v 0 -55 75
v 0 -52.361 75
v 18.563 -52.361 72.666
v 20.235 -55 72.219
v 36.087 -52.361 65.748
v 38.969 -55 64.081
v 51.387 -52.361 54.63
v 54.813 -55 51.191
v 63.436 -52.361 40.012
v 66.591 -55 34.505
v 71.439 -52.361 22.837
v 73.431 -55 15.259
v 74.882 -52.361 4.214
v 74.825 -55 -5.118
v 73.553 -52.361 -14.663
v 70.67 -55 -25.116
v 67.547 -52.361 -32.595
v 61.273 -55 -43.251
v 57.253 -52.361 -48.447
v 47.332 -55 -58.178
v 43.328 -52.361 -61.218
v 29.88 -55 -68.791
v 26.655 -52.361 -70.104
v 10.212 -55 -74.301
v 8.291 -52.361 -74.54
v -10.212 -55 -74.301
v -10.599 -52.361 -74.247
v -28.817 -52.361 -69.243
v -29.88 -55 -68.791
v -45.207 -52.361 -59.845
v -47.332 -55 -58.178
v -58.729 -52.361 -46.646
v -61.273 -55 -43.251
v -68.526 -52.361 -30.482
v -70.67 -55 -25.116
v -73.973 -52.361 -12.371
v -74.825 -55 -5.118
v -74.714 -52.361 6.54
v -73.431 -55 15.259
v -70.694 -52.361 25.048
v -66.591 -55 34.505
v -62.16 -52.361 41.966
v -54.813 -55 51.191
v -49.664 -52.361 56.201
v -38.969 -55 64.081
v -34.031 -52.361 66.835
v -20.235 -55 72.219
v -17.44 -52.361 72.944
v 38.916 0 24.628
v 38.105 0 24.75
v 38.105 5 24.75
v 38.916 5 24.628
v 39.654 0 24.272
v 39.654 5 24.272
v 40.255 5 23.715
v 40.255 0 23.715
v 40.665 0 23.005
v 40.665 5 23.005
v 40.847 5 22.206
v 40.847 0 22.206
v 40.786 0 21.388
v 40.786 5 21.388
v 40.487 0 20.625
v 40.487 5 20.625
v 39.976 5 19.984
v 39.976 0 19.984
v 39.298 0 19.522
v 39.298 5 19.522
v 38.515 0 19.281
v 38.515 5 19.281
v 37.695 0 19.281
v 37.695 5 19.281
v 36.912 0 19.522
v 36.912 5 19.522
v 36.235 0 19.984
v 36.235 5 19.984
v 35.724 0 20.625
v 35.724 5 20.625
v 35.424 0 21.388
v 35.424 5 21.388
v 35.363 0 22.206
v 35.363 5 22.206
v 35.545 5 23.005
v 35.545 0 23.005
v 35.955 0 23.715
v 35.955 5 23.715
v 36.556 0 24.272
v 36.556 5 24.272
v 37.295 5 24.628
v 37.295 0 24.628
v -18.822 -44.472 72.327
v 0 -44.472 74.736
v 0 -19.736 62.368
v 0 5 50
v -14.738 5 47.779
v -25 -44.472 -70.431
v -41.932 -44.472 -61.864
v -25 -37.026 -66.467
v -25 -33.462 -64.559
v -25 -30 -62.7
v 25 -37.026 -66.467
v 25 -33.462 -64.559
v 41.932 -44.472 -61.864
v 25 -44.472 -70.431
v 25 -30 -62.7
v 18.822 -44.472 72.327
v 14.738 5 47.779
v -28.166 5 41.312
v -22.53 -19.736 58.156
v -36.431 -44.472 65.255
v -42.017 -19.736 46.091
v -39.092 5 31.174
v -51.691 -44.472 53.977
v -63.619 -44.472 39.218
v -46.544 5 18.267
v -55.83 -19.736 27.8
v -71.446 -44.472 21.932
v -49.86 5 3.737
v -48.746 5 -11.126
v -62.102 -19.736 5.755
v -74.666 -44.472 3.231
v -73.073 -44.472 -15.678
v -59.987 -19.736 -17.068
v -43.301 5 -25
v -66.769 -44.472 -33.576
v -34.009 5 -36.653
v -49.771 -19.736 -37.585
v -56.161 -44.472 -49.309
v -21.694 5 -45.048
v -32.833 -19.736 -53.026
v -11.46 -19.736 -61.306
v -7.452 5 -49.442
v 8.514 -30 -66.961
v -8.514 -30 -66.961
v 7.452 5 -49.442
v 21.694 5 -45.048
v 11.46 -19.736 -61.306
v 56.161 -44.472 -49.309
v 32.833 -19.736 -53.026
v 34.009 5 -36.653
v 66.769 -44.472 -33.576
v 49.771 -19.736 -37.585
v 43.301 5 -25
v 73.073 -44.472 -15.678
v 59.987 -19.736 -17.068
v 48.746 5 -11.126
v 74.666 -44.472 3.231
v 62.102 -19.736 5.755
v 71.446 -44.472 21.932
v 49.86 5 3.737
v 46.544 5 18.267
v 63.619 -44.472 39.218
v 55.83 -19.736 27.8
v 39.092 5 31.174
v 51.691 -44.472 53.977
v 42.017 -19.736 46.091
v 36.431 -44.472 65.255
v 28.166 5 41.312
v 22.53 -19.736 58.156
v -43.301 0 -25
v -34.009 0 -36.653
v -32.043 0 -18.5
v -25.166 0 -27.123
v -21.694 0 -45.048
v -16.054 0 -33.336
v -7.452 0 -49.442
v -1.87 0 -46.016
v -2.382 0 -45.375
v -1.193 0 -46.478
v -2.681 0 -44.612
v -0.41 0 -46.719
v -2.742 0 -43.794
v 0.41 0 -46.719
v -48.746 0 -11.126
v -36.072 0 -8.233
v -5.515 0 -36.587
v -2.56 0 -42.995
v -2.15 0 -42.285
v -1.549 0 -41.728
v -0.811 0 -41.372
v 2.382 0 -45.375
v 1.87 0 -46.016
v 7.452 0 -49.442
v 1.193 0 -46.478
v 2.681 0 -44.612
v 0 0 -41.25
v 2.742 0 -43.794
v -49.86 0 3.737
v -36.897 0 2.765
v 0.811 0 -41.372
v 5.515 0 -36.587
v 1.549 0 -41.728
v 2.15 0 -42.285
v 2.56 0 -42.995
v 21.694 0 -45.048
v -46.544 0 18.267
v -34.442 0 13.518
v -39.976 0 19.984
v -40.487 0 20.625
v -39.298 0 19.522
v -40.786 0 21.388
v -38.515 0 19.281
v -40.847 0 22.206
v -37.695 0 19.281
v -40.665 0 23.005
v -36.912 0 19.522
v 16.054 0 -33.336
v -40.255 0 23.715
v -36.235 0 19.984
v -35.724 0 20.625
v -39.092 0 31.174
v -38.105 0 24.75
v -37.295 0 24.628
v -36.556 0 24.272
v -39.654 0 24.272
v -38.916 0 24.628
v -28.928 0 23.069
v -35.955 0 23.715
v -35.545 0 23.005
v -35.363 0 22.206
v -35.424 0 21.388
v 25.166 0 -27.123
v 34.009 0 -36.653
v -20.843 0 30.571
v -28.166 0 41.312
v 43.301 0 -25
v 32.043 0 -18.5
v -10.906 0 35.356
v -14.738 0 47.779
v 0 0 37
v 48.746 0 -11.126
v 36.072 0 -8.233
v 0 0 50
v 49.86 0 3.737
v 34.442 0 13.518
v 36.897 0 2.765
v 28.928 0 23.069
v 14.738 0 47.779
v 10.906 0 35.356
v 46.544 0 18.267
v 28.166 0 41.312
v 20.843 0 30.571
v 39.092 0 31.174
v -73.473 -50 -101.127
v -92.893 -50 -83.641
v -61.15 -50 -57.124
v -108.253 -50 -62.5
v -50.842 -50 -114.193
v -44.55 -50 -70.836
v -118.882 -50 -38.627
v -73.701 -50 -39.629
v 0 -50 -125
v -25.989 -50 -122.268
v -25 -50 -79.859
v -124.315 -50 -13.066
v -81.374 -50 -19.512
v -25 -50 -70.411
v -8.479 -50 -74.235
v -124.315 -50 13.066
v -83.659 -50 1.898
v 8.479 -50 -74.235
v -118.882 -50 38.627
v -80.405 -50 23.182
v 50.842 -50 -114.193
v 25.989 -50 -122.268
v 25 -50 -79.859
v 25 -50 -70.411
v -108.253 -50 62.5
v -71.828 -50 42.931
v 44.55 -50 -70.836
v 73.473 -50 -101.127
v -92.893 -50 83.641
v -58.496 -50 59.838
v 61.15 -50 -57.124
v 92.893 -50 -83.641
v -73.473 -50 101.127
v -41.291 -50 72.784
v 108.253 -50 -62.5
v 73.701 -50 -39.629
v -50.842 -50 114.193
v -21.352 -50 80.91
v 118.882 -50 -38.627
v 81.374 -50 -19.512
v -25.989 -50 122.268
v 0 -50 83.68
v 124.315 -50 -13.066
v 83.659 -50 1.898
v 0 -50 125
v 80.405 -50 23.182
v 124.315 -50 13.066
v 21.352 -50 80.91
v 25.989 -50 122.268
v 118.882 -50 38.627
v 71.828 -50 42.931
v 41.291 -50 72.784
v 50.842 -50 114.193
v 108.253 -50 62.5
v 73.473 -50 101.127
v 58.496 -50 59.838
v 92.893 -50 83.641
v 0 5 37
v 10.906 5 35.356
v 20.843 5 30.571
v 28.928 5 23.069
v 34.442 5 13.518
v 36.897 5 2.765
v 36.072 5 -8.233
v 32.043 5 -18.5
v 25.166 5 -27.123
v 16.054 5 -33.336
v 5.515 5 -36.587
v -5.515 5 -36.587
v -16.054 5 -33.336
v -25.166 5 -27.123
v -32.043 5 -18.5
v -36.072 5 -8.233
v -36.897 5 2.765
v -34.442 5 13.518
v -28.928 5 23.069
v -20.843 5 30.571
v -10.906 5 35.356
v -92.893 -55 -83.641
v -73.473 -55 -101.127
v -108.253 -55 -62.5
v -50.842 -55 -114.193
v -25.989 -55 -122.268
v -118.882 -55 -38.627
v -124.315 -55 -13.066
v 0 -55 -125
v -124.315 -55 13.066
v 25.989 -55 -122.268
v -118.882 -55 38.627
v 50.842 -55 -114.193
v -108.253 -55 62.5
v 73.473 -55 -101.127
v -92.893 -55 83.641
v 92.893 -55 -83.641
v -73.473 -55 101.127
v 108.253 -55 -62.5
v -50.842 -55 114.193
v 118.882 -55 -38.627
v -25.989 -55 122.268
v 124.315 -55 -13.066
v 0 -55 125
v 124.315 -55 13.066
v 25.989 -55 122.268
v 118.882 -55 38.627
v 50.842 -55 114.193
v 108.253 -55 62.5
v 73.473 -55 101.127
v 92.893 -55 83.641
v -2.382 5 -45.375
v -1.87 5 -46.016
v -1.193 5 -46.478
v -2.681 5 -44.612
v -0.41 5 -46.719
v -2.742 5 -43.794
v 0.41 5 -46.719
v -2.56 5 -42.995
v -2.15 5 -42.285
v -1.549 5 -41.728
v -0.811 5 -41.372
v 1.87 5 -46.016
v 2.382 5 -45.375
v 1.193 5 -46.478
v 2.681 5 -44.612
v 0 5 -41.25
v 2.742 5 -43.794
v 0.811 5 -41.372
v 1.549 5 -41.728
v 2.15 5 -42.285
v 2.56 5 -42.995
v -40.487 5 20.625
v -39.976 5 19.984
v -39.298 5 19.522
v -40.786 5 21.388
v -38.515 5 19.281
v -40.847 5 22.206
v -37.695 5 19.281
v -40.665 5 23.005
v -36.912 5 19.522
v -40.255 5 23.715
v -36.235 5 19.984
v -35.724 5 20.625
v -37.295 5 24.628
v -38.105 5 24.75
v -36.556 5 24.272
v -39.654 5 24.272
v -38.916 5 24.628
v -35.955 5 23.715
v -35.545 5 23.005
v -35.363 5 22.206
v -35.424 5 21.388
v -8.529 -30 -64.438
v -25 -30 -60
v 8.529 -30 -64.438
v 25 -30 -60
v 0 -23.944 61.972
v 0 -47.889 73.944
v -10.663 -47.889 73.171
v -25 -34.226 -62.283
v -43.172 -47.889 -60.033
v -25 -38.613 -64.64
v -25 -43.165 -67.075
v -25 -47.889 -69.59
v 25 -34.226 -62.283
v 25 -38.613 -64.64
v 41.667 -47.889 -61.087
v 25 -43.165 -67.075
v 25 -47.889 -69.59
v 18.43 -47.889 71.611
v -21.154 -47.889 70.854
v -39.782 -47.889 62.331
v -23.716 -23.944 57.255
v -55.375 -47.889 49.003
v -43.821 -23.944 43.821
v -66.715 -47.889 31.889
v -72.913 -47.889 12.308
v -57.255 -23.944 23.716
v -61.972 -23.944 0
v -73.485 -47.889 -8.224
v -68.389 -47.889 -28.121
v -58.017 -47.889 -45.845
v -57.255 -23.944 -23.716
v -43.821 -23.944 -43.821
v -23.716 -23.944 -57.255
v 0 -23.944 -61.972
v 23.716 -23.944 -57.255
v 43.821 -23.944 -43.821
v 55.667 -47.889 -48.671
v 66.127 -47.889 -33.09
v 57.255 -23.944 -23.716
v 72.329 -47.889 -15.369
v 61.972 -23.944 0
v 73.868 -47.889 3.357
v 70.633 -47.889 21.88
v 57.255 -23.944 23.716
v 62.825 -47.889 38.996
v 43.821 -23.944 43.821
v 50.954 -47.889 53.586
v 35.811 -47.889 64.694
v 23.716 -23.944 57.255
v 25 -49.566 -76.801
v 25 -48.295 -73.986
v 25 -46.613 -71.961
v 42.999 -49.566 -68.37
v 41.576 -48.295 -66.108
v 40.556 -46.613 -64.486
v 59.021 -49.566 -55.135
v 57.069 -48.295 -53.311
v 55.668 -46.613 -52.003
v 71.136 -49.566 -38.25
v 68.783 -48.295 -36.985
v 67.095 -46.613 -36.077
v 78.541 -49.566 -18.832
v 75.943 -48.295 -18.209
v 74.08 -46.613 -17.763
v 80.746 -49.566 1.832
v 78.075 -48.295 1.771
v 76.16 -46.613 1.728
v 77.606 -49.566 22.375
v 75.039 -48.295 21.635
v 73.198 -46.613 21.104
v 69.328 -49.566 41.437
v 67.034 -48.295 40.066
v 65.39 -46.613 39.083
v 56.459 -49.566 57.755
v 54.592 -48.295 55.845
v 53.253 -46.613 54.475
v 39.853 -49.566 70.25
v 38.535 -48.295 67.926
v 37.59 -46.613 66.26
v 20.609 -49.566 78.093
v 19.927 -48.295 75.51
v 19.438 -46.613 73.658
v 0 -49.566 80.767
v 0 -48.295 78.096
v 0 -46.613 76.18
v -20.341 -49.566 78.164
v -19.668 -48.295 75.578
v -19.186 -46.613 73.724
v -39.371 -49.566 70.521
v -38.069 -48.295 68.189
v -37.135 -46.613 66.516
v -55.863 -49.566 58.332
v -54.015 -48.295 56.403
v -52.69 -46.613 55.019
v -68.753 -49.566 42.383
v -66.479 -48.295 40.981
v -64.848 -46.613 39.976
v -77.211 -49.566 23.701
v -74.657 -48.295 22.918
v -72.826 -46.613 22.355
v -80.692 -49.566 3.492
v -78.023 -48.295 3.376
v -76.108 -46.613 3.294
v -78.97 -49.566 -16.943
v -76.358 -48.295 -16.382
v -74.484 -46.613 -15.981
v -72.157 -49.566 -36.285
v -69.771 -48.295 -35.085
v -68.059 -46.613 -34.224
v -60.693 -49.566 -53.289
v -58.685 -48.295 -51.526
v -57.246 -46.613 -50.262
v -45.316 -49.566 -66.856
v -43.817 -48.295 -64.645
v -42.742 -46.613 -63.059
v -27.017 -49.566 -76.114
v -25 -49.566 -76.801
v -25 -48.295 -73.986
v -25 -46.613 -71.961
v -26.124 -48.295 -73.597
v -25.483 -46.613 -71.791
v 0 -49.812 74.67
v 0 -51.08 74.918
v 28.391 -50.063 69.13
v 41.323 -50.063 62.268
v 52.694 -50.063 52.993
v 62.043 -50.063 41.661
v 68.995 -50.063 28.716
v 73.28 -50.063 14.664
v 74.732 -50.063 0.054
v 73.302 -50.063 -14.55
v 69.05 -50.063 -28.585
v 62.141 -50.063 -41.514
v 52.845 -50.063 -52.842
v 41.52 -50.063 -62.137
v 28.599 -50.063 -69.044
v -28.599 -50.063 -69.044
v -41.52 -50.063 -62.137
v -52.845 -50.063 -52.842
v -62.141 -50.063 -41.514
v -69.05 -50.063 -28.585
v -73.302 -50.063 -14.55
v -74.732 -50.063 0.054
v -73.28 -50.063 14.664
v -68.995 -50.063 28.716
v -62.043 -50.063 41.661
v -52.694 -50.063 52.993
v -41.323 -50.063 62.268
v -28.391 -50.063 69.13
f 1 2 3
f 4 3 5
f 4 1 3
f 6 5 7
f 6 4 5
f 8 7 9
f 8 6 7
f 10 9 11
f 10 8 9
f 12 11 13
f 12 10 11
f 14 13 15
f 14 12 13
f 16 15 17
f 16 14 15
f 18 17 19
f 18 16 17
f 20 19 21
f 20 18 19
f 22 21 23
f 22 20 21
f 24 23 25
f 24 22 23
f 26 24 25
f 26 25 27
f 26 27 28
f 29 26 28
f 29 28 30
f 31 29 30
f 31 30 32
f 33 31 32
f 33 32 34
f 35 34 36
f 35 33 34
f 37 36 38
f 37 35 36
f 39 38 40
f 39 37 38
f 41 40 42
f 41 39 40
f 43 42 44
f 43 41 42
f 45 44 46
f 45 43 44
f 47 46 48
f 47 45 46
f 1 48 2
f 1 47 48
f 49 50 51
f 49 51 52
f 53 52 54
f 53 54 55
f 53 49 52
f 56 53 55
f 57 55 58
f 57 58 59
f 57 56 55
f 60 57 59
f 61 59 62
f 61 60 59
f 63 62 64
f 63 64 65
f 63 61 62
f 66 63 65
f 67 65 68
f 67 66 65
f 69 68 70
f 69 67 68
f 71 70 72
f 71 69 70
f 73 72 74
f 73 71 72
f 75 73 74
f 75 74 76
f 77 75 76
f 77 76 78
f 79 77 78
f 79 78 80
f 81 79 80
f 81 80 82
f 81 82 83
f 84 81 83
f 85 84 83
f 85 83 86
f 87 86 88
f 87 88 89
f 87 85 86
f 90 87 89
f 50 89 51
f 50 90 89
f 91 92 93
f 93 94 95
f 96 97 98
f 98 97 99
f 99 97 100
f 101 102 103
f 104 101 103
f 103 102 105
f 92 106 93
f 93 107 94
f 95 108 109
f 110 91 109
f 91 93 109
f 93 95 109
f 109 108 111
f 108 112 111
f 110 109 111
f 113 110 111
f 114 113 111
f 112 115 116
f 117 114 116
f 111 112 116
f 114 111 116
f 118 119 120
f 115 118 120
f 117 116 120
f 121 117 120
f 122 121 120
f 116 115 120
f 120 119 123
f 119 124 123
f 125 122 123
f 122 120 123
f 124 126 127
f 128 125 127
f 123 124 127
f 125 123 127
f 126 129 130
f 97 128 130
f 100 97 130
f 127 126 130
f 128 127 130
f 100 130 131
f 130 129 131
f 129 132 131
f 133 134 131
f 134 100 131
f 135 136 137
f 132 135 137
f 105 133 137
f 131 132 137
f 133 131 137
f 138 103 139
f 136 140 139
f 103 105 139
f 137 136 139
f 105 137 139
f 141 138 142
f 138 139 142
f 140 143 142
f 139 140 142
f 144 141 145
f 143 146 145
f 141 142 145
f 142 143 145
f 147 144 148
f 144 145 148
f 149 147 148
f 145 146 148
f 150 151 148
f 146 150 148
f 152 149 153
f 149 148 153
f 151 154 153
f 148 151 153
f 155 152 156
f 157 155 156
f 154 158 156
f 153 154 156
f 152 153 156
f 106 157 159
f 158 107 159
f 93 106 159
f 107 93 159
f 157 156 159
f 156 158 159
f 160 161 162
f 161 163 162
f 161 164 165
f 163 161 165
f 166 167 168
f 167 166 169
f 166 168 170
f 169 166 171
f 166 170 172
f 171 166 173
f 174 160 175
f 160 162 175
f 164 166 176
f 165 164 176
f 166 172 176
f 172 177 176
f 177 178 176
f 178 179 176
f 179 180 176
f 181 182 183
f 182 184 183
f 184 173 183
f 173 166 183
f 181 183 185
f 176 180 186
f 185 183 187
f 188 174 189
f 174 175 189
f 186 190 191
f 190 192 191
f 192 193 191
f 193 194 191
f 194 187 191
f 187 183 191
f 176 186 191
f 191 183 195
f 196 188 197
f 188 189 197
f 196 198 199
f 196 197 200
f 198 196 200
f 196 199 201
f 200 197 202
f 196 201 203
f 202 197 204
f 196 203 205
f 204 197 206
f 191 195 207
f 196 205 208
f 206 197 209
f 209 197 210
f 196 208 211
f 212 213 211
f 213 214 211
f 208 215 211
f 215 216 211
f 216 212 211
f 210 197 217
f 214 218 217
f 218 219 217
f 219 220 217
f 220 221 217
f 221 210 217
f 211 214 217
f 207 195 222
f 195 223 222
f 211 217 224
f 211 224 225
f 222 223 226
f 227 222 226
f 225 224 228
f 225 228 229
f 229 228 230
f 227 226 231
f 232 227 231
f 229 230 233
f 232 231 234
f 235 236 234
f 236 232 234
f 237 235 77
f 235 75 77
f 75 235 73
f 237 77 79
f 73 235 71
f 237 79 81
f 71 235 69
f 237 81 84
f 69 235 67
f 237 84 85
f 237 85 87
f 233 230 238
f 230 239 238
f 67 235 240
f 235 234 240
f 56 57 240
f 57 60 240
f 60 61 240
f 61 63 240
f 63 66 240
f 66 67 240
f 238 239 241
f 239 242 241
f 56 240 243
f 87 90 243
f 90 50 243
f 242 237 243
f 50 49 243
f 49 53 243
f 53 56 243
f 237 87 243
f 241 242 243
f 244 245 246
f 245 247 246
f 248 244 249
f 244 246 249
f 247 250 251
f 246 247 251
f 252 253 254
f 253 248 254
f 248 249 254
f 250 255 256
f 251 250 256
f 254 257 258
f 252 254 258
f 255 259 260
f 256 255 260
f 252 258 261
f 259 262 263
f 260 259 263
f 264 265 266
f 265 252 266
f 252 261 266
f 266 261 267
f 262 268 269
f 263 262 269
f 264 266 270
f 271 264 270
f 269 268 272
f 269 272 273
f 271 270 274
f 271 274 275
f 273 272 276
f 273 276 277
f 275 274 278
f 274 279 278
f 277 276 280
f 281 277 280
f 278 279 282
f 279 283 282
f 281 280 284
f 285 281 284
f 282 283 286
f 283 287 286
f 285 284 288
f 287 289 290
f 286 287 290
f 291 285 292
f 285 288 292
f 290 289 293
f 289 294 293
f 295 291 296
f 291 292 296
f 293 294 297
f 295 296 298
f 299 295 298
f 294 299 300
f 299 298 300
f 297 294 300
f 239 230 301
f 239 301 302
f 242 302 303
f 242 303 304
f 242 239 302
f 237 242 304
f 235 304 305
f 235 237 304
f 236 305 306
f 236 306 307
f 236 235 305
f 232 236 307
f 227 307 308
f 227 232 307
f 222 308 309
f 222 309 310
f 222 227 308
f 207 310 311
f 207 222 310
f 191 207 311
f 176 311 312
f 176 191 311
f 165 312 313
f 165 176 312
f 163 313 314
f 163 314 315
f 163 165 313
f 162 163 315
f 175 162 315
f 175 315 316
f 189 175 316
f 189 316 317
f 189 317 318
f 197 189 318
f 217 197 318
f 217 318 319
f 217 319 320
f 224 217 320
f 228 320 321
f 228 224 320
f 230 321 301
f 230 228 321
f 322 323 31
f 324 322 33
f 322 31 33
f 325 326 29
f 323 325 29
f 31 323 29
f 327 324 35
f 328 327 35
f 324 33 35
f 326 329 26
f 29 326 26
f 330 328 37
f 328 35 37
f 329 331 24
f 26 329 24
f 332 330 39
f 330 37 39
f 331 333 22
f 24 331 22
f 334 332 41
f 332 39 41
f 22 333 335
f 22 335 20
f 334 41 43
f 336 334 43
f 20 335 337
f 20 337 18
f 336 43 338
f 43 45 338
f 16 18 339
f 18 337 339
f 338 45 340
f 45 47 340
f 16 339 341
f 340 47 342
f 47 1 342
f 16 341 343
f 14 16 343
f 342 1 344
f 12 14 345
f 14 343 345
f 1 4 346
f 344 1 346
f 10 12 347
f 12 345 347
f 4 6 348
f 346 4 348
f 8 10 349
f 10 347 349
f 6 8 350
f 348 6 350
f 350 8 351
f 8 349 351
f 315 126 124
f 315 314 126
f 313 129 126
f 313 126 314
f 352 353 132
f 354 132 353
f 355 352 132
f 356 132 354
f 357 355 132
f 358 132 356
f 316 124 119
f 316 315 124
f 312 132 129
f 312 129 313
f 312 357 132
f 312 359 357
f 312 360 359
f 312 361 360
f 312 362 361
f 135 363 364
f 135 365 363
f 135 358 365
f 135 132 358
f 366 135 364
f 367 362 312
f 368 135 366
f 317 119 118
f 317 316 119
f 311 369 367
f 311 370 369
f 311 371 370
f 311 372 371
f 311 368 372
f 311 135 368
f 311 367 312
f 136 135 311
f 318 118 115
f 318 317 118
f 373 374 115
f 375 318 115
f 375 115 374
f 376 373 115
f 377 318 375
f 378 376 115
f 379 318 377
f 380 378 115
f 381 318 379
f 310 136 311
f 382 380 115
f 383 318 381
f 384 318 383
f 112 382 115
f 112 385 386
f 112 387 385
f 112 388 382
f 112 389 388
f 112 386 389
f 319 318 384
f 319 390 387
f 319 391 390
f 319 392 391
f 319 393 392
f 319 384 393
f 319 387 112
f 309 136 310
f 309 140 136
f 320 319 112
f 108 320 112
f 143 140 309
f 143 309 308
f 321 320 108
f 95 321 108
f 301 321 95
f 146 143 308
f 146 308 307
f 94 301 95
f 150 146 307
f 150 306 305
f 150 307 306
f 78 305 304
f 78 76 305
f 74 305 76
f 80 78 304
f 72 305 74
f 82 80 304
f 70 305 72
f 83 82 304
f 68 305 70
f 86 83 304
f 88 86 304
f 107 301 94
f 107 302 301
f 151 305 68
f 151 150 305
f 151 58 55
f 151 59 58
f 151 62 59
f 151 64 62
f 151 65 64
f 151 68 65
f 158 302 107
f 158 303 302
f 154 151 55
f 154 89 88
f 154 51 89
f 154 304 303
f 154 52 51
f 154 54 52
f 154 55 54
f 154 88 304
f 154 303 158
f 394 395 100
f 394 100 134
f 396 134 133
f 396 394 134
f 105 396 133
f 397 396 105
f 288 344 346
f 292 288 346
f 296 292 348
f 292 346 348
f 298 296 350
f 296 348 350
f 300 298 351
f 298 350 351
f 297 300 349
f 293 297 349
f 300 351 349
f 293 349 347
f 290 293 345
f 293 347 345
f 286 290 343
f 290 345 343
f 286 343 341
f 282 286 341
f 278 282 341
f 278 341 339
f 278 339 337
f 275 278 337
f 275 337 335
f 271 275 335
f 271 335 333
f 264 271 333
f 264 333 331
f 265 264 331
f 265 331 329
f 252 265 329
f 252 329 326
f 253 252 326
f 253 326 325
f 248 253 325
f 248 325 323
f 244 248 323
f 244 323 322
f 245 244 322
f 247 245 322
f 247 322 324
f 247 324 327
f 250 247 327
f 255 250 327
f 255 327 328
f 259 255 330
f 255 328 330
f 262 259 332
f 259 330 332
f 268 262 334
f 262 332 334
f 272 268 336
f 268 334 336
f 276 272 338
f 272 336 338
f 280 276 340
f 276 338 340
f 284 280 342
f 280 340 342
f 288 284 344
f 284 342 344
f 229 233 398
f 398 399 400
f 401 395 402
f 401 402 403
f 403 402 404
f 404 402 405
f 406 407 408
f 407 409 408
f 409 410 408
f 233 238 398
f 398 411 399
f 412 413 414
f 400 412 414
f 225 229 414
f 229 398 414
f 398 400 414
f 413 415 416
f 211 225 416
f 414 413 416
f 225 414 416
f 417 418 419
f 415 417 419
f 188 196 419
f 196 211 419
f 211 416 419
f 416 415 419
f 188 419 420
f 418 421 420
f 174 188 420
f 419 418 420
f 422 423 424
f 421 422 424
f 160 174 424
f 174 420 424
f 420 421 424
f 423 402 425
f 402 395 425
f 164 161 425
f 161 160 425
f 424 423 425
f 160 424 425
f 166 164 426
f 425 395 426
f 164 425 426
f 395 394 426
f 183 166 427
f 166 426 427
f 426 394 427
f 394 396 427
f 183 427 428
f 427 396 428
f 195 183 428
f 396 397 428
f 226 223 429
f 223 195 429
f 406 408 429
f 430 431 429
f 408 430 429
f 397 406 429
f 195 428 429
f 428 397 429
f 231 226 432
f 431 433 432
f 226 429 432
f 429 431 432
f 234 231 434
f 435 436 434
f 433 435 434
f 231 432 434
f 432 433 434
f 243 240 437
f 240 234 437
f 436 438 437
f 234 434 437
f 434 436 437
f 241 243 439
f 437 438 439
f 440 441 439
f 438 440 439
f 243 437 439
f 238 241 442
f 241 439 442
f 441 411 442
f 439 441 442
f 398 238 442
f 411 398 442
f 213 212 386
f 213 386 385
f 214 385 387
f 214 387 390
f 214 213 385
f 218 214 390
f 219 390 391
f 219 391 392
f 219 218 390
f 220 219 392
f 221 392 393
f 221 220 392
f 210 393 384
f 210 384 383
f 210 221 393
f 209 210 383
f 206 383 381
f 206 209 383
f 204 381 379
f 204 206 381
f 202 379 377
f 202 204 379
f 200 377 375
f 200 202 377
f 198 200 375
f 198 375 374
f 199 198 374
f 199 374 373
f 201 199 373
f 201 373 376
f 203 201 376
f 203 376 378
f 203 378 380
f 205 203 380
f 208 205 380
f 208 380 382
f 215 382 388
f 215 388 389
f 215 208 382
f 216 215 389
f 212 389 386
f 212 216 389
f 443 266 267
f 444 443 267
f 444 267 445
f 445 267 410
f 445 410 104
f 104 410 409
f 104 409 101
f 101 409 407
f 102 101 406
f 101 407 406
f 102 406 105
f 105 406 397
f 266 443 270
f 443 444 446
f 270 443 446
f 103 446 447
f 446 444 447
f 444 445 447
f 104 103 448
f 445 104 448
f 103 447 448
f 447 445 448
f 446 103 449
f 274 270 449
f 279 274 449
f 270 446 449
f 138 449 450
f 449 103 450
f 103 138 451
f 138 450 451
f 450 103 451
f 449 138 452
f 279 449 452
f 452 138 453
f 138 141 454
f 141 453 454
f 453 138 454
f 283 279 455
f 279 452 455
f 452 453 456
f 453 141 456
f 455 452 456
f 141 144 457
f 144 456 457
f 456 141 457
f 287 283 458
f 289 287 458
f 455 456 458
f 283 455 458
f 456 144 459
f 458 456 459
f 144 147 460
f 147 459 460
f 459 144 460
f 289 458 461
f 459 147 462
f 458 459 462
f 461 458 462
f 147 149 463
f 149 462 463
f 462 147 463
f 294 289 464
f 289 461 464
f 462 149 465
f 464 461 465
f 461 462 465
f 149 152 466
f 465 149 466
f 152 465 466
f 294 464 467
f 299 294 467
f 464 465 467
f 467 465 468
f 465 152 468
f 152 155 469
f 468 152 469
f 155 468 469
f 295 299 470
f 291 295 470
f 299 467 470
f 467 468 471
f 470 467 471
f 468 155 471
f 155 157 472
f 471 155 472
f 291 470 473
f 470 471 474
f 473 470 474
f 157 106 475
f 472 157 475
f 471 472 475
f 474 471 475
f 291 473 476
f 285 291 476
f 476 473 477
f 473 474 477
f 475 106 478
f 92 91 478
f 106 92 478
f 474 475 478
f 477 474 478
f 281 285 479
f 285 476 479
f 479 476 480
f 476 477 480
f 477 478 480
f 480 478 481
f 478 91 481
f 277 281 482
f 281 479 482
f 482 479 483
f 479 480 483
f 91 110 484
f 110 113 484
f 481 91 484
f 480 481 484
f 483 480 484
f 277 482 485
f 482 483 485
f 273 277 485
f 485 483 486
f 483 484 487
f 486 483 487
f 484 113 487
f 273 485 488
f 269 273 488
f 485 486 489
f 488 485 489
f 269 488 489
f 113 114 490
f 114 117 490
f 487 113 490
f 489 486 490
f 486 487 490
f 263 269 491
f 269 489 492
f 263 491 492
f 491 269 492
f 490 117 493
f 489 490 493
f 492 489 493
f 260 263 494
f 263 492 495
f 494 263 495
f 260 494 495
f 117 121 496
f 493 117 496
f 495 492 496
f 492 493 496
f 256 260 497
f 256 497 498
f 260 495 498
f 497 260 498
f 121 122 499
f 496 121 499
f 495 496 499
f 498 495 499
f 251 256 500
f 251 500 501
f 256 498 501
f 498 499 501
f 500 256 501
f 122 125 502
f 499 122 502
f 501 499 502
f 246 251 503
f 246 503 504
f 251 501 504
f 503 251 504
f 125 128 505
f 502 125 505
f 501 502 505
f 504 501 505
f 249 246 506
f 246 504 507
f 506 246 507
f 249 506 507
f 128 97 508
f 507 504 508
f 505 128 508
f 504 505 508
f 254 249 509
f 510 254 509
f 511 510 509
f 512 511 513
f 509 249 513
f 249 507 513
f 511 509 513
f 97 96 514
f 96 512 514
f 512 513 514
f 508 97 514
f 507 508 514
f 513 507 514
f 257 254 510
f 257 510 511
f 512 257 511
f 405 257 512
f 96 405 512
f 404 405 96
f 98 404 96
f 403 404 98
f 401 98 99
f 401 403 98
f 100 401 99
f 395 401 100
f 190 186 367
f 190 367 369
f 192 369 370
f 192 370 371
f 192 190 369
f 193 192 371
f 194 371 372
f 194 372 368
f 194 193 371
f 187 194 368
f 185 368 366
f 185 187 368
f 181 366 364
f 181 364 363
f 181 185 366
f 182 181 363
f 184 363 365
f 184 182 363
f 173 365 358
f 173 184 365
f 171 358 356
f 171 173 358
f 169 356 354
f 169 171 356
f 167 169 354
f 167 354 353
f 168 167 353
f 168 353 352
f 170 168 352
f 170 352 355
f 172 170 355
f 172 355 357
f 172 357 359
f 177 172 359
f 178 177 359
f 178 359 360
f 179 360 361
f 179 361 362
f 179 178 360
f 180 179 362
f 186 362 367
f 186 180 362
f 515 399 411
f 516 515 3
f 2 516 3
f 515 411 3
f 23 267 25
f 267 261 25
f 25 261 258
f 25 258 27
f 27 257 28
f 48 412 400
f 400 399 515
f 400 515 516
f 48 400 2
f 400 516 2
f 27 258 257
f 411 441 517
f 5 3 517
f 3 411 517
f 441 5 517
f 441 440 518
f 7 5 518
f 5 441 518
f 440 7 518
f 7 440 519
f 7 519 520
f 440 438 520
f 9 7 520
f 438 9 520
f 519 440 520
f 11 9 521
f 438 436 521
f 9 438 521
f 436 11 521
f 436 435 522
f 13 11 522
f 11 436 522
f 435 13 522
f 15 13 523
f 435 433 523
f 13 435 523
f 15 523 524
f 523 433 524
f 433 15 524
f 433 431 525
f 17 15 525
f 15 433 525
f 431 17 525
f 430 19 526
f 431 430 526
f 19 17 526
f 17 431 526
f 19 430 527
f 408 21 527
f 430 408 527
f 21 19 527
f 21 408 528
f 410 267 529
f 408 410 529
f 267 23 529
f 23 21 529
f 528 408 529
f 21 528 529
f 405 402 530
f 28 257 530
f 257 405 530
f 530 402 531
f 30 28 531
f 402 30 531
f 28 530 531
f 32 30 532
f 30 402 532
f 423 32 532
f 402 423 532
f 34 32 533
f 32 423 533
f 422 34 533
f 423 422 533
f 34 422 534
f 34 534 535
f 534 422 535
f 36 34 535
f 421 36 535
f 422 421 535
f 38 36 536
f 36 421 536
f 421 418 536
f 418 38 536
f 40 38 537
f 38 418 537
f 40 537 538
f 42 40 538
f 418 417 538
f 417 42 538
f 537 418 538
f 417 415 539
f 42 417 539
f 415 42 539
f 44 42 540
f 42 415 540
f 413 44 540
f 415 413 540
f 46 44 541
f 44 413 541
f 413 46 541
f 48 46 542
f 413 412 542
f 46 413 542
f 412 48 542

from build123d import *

# Parameters (mm, degrees)
SKETCH1_R           = 50
SKETCH1_R_2         = 2.75
SKETCH1_R_3         = 37
BOSS_EXTRUDE1_DEPTH = 5
SKETCH2_R           = 125
SKETCH2_R_2         = 75
BOSS_EXTRUDE2_DEPTH = 5
FILLET1_R           = 10
SKETCH4_W           = 50
SKETCH4_H           = 20
CUT_EXTRUDE1_DEPTH  = 186.135085845


with BuildPart() as part:
    # Sketch1 → Boss-Extrude1 (new body)
    with BuildSketch(Plane(origin=(0, 0, 0), x_dir=(1, 0, 0), z_dir=(0, 1, 0))):
        with Locations(Location((0, 0, 0), (0, 0, 270))):
            Circle(SKETCH1_R)
        with Locations(Location((0, 44, 0), (0, 0, 270))):
            Circle(SKETCH1_R_2, mode=Mode.SUBTRACT)
        with Locations(Location((38.105117767, -22, 0), (0, 0, 270))):
            Circle(SKETCH1_R_2, mode=Mode.SUBTRACT)
        with Locations(Location((-38.105117767, -22, 0), (0, 0, 270))):
            Circle(SKETCH1_R_2, mode=Mode.SUBTRACT)
        with Locations(Location((0, 0, 0), (0, 0, 270))):
            Circle(SKETCH1_R_3, mode=Mode.SUBTRACT)
    extrude(amount=BOSS_EXTRUDE1_DEPTH)



with BuildPart() as body_2:
    # Sketch2 → Boss-Extrude2 (new body)
    with BuildSketch(Plane(origin=(0, -55, 0), x_dir=(1, 0, 0), z_dir=(0, 1, 0))):
        with Locations(Location((0, 0, 0), (0, 0, 270))):
            Circle(SKETCH2_R)
        with Locations(Location((0, 0, 0), (0, 0, 270))):
            Circle(SKETCH2_R_2, mode=Mode.SUBTRACT)
    extrude(amount=BOSS_EXTRUDE2_DEPTH)


with BuildPart() as part_1:
    add(part.part)

    add(body_2.part)  # Revolve1 merges body 2
    # Sketch3 → Revolve1 (revolve)
    with BuildSketch(Plane.XY, mode=Mode.PRIVATE) as revolve1_sk:
        Polygon((-50, 0), (-75, -50), (-77.5, -50), (-50, 5), align=None)
    revolve(revolve1_sk.sketch.rotate(Axis((0, 0, 0), (0, -1, 0)), 270), axis=Axis((0, 0, 0), (0, -1, 0)))

    # Fillet1
    fillet1_edges = [part_1.edges().sort_by_distance(p)[0] for p in [
        (0, -50, -75),
        (0, -50, -77.5),
    ]]
    fillet(fillet1_edges, radius=FILLET1_R)

    # Sketch4 → Cut-Extrude1 (cut, through all)
    with BuildSketch(Plane.XY):
        with Locations((0, -40)):
            Rectangle(SKETCH4_W, SKETCH4_H)
    extrude(amount=-CUT_EXTRUDE1_DEPTH, mode=Mode.SUBTRACT)


solid = part_1.part
